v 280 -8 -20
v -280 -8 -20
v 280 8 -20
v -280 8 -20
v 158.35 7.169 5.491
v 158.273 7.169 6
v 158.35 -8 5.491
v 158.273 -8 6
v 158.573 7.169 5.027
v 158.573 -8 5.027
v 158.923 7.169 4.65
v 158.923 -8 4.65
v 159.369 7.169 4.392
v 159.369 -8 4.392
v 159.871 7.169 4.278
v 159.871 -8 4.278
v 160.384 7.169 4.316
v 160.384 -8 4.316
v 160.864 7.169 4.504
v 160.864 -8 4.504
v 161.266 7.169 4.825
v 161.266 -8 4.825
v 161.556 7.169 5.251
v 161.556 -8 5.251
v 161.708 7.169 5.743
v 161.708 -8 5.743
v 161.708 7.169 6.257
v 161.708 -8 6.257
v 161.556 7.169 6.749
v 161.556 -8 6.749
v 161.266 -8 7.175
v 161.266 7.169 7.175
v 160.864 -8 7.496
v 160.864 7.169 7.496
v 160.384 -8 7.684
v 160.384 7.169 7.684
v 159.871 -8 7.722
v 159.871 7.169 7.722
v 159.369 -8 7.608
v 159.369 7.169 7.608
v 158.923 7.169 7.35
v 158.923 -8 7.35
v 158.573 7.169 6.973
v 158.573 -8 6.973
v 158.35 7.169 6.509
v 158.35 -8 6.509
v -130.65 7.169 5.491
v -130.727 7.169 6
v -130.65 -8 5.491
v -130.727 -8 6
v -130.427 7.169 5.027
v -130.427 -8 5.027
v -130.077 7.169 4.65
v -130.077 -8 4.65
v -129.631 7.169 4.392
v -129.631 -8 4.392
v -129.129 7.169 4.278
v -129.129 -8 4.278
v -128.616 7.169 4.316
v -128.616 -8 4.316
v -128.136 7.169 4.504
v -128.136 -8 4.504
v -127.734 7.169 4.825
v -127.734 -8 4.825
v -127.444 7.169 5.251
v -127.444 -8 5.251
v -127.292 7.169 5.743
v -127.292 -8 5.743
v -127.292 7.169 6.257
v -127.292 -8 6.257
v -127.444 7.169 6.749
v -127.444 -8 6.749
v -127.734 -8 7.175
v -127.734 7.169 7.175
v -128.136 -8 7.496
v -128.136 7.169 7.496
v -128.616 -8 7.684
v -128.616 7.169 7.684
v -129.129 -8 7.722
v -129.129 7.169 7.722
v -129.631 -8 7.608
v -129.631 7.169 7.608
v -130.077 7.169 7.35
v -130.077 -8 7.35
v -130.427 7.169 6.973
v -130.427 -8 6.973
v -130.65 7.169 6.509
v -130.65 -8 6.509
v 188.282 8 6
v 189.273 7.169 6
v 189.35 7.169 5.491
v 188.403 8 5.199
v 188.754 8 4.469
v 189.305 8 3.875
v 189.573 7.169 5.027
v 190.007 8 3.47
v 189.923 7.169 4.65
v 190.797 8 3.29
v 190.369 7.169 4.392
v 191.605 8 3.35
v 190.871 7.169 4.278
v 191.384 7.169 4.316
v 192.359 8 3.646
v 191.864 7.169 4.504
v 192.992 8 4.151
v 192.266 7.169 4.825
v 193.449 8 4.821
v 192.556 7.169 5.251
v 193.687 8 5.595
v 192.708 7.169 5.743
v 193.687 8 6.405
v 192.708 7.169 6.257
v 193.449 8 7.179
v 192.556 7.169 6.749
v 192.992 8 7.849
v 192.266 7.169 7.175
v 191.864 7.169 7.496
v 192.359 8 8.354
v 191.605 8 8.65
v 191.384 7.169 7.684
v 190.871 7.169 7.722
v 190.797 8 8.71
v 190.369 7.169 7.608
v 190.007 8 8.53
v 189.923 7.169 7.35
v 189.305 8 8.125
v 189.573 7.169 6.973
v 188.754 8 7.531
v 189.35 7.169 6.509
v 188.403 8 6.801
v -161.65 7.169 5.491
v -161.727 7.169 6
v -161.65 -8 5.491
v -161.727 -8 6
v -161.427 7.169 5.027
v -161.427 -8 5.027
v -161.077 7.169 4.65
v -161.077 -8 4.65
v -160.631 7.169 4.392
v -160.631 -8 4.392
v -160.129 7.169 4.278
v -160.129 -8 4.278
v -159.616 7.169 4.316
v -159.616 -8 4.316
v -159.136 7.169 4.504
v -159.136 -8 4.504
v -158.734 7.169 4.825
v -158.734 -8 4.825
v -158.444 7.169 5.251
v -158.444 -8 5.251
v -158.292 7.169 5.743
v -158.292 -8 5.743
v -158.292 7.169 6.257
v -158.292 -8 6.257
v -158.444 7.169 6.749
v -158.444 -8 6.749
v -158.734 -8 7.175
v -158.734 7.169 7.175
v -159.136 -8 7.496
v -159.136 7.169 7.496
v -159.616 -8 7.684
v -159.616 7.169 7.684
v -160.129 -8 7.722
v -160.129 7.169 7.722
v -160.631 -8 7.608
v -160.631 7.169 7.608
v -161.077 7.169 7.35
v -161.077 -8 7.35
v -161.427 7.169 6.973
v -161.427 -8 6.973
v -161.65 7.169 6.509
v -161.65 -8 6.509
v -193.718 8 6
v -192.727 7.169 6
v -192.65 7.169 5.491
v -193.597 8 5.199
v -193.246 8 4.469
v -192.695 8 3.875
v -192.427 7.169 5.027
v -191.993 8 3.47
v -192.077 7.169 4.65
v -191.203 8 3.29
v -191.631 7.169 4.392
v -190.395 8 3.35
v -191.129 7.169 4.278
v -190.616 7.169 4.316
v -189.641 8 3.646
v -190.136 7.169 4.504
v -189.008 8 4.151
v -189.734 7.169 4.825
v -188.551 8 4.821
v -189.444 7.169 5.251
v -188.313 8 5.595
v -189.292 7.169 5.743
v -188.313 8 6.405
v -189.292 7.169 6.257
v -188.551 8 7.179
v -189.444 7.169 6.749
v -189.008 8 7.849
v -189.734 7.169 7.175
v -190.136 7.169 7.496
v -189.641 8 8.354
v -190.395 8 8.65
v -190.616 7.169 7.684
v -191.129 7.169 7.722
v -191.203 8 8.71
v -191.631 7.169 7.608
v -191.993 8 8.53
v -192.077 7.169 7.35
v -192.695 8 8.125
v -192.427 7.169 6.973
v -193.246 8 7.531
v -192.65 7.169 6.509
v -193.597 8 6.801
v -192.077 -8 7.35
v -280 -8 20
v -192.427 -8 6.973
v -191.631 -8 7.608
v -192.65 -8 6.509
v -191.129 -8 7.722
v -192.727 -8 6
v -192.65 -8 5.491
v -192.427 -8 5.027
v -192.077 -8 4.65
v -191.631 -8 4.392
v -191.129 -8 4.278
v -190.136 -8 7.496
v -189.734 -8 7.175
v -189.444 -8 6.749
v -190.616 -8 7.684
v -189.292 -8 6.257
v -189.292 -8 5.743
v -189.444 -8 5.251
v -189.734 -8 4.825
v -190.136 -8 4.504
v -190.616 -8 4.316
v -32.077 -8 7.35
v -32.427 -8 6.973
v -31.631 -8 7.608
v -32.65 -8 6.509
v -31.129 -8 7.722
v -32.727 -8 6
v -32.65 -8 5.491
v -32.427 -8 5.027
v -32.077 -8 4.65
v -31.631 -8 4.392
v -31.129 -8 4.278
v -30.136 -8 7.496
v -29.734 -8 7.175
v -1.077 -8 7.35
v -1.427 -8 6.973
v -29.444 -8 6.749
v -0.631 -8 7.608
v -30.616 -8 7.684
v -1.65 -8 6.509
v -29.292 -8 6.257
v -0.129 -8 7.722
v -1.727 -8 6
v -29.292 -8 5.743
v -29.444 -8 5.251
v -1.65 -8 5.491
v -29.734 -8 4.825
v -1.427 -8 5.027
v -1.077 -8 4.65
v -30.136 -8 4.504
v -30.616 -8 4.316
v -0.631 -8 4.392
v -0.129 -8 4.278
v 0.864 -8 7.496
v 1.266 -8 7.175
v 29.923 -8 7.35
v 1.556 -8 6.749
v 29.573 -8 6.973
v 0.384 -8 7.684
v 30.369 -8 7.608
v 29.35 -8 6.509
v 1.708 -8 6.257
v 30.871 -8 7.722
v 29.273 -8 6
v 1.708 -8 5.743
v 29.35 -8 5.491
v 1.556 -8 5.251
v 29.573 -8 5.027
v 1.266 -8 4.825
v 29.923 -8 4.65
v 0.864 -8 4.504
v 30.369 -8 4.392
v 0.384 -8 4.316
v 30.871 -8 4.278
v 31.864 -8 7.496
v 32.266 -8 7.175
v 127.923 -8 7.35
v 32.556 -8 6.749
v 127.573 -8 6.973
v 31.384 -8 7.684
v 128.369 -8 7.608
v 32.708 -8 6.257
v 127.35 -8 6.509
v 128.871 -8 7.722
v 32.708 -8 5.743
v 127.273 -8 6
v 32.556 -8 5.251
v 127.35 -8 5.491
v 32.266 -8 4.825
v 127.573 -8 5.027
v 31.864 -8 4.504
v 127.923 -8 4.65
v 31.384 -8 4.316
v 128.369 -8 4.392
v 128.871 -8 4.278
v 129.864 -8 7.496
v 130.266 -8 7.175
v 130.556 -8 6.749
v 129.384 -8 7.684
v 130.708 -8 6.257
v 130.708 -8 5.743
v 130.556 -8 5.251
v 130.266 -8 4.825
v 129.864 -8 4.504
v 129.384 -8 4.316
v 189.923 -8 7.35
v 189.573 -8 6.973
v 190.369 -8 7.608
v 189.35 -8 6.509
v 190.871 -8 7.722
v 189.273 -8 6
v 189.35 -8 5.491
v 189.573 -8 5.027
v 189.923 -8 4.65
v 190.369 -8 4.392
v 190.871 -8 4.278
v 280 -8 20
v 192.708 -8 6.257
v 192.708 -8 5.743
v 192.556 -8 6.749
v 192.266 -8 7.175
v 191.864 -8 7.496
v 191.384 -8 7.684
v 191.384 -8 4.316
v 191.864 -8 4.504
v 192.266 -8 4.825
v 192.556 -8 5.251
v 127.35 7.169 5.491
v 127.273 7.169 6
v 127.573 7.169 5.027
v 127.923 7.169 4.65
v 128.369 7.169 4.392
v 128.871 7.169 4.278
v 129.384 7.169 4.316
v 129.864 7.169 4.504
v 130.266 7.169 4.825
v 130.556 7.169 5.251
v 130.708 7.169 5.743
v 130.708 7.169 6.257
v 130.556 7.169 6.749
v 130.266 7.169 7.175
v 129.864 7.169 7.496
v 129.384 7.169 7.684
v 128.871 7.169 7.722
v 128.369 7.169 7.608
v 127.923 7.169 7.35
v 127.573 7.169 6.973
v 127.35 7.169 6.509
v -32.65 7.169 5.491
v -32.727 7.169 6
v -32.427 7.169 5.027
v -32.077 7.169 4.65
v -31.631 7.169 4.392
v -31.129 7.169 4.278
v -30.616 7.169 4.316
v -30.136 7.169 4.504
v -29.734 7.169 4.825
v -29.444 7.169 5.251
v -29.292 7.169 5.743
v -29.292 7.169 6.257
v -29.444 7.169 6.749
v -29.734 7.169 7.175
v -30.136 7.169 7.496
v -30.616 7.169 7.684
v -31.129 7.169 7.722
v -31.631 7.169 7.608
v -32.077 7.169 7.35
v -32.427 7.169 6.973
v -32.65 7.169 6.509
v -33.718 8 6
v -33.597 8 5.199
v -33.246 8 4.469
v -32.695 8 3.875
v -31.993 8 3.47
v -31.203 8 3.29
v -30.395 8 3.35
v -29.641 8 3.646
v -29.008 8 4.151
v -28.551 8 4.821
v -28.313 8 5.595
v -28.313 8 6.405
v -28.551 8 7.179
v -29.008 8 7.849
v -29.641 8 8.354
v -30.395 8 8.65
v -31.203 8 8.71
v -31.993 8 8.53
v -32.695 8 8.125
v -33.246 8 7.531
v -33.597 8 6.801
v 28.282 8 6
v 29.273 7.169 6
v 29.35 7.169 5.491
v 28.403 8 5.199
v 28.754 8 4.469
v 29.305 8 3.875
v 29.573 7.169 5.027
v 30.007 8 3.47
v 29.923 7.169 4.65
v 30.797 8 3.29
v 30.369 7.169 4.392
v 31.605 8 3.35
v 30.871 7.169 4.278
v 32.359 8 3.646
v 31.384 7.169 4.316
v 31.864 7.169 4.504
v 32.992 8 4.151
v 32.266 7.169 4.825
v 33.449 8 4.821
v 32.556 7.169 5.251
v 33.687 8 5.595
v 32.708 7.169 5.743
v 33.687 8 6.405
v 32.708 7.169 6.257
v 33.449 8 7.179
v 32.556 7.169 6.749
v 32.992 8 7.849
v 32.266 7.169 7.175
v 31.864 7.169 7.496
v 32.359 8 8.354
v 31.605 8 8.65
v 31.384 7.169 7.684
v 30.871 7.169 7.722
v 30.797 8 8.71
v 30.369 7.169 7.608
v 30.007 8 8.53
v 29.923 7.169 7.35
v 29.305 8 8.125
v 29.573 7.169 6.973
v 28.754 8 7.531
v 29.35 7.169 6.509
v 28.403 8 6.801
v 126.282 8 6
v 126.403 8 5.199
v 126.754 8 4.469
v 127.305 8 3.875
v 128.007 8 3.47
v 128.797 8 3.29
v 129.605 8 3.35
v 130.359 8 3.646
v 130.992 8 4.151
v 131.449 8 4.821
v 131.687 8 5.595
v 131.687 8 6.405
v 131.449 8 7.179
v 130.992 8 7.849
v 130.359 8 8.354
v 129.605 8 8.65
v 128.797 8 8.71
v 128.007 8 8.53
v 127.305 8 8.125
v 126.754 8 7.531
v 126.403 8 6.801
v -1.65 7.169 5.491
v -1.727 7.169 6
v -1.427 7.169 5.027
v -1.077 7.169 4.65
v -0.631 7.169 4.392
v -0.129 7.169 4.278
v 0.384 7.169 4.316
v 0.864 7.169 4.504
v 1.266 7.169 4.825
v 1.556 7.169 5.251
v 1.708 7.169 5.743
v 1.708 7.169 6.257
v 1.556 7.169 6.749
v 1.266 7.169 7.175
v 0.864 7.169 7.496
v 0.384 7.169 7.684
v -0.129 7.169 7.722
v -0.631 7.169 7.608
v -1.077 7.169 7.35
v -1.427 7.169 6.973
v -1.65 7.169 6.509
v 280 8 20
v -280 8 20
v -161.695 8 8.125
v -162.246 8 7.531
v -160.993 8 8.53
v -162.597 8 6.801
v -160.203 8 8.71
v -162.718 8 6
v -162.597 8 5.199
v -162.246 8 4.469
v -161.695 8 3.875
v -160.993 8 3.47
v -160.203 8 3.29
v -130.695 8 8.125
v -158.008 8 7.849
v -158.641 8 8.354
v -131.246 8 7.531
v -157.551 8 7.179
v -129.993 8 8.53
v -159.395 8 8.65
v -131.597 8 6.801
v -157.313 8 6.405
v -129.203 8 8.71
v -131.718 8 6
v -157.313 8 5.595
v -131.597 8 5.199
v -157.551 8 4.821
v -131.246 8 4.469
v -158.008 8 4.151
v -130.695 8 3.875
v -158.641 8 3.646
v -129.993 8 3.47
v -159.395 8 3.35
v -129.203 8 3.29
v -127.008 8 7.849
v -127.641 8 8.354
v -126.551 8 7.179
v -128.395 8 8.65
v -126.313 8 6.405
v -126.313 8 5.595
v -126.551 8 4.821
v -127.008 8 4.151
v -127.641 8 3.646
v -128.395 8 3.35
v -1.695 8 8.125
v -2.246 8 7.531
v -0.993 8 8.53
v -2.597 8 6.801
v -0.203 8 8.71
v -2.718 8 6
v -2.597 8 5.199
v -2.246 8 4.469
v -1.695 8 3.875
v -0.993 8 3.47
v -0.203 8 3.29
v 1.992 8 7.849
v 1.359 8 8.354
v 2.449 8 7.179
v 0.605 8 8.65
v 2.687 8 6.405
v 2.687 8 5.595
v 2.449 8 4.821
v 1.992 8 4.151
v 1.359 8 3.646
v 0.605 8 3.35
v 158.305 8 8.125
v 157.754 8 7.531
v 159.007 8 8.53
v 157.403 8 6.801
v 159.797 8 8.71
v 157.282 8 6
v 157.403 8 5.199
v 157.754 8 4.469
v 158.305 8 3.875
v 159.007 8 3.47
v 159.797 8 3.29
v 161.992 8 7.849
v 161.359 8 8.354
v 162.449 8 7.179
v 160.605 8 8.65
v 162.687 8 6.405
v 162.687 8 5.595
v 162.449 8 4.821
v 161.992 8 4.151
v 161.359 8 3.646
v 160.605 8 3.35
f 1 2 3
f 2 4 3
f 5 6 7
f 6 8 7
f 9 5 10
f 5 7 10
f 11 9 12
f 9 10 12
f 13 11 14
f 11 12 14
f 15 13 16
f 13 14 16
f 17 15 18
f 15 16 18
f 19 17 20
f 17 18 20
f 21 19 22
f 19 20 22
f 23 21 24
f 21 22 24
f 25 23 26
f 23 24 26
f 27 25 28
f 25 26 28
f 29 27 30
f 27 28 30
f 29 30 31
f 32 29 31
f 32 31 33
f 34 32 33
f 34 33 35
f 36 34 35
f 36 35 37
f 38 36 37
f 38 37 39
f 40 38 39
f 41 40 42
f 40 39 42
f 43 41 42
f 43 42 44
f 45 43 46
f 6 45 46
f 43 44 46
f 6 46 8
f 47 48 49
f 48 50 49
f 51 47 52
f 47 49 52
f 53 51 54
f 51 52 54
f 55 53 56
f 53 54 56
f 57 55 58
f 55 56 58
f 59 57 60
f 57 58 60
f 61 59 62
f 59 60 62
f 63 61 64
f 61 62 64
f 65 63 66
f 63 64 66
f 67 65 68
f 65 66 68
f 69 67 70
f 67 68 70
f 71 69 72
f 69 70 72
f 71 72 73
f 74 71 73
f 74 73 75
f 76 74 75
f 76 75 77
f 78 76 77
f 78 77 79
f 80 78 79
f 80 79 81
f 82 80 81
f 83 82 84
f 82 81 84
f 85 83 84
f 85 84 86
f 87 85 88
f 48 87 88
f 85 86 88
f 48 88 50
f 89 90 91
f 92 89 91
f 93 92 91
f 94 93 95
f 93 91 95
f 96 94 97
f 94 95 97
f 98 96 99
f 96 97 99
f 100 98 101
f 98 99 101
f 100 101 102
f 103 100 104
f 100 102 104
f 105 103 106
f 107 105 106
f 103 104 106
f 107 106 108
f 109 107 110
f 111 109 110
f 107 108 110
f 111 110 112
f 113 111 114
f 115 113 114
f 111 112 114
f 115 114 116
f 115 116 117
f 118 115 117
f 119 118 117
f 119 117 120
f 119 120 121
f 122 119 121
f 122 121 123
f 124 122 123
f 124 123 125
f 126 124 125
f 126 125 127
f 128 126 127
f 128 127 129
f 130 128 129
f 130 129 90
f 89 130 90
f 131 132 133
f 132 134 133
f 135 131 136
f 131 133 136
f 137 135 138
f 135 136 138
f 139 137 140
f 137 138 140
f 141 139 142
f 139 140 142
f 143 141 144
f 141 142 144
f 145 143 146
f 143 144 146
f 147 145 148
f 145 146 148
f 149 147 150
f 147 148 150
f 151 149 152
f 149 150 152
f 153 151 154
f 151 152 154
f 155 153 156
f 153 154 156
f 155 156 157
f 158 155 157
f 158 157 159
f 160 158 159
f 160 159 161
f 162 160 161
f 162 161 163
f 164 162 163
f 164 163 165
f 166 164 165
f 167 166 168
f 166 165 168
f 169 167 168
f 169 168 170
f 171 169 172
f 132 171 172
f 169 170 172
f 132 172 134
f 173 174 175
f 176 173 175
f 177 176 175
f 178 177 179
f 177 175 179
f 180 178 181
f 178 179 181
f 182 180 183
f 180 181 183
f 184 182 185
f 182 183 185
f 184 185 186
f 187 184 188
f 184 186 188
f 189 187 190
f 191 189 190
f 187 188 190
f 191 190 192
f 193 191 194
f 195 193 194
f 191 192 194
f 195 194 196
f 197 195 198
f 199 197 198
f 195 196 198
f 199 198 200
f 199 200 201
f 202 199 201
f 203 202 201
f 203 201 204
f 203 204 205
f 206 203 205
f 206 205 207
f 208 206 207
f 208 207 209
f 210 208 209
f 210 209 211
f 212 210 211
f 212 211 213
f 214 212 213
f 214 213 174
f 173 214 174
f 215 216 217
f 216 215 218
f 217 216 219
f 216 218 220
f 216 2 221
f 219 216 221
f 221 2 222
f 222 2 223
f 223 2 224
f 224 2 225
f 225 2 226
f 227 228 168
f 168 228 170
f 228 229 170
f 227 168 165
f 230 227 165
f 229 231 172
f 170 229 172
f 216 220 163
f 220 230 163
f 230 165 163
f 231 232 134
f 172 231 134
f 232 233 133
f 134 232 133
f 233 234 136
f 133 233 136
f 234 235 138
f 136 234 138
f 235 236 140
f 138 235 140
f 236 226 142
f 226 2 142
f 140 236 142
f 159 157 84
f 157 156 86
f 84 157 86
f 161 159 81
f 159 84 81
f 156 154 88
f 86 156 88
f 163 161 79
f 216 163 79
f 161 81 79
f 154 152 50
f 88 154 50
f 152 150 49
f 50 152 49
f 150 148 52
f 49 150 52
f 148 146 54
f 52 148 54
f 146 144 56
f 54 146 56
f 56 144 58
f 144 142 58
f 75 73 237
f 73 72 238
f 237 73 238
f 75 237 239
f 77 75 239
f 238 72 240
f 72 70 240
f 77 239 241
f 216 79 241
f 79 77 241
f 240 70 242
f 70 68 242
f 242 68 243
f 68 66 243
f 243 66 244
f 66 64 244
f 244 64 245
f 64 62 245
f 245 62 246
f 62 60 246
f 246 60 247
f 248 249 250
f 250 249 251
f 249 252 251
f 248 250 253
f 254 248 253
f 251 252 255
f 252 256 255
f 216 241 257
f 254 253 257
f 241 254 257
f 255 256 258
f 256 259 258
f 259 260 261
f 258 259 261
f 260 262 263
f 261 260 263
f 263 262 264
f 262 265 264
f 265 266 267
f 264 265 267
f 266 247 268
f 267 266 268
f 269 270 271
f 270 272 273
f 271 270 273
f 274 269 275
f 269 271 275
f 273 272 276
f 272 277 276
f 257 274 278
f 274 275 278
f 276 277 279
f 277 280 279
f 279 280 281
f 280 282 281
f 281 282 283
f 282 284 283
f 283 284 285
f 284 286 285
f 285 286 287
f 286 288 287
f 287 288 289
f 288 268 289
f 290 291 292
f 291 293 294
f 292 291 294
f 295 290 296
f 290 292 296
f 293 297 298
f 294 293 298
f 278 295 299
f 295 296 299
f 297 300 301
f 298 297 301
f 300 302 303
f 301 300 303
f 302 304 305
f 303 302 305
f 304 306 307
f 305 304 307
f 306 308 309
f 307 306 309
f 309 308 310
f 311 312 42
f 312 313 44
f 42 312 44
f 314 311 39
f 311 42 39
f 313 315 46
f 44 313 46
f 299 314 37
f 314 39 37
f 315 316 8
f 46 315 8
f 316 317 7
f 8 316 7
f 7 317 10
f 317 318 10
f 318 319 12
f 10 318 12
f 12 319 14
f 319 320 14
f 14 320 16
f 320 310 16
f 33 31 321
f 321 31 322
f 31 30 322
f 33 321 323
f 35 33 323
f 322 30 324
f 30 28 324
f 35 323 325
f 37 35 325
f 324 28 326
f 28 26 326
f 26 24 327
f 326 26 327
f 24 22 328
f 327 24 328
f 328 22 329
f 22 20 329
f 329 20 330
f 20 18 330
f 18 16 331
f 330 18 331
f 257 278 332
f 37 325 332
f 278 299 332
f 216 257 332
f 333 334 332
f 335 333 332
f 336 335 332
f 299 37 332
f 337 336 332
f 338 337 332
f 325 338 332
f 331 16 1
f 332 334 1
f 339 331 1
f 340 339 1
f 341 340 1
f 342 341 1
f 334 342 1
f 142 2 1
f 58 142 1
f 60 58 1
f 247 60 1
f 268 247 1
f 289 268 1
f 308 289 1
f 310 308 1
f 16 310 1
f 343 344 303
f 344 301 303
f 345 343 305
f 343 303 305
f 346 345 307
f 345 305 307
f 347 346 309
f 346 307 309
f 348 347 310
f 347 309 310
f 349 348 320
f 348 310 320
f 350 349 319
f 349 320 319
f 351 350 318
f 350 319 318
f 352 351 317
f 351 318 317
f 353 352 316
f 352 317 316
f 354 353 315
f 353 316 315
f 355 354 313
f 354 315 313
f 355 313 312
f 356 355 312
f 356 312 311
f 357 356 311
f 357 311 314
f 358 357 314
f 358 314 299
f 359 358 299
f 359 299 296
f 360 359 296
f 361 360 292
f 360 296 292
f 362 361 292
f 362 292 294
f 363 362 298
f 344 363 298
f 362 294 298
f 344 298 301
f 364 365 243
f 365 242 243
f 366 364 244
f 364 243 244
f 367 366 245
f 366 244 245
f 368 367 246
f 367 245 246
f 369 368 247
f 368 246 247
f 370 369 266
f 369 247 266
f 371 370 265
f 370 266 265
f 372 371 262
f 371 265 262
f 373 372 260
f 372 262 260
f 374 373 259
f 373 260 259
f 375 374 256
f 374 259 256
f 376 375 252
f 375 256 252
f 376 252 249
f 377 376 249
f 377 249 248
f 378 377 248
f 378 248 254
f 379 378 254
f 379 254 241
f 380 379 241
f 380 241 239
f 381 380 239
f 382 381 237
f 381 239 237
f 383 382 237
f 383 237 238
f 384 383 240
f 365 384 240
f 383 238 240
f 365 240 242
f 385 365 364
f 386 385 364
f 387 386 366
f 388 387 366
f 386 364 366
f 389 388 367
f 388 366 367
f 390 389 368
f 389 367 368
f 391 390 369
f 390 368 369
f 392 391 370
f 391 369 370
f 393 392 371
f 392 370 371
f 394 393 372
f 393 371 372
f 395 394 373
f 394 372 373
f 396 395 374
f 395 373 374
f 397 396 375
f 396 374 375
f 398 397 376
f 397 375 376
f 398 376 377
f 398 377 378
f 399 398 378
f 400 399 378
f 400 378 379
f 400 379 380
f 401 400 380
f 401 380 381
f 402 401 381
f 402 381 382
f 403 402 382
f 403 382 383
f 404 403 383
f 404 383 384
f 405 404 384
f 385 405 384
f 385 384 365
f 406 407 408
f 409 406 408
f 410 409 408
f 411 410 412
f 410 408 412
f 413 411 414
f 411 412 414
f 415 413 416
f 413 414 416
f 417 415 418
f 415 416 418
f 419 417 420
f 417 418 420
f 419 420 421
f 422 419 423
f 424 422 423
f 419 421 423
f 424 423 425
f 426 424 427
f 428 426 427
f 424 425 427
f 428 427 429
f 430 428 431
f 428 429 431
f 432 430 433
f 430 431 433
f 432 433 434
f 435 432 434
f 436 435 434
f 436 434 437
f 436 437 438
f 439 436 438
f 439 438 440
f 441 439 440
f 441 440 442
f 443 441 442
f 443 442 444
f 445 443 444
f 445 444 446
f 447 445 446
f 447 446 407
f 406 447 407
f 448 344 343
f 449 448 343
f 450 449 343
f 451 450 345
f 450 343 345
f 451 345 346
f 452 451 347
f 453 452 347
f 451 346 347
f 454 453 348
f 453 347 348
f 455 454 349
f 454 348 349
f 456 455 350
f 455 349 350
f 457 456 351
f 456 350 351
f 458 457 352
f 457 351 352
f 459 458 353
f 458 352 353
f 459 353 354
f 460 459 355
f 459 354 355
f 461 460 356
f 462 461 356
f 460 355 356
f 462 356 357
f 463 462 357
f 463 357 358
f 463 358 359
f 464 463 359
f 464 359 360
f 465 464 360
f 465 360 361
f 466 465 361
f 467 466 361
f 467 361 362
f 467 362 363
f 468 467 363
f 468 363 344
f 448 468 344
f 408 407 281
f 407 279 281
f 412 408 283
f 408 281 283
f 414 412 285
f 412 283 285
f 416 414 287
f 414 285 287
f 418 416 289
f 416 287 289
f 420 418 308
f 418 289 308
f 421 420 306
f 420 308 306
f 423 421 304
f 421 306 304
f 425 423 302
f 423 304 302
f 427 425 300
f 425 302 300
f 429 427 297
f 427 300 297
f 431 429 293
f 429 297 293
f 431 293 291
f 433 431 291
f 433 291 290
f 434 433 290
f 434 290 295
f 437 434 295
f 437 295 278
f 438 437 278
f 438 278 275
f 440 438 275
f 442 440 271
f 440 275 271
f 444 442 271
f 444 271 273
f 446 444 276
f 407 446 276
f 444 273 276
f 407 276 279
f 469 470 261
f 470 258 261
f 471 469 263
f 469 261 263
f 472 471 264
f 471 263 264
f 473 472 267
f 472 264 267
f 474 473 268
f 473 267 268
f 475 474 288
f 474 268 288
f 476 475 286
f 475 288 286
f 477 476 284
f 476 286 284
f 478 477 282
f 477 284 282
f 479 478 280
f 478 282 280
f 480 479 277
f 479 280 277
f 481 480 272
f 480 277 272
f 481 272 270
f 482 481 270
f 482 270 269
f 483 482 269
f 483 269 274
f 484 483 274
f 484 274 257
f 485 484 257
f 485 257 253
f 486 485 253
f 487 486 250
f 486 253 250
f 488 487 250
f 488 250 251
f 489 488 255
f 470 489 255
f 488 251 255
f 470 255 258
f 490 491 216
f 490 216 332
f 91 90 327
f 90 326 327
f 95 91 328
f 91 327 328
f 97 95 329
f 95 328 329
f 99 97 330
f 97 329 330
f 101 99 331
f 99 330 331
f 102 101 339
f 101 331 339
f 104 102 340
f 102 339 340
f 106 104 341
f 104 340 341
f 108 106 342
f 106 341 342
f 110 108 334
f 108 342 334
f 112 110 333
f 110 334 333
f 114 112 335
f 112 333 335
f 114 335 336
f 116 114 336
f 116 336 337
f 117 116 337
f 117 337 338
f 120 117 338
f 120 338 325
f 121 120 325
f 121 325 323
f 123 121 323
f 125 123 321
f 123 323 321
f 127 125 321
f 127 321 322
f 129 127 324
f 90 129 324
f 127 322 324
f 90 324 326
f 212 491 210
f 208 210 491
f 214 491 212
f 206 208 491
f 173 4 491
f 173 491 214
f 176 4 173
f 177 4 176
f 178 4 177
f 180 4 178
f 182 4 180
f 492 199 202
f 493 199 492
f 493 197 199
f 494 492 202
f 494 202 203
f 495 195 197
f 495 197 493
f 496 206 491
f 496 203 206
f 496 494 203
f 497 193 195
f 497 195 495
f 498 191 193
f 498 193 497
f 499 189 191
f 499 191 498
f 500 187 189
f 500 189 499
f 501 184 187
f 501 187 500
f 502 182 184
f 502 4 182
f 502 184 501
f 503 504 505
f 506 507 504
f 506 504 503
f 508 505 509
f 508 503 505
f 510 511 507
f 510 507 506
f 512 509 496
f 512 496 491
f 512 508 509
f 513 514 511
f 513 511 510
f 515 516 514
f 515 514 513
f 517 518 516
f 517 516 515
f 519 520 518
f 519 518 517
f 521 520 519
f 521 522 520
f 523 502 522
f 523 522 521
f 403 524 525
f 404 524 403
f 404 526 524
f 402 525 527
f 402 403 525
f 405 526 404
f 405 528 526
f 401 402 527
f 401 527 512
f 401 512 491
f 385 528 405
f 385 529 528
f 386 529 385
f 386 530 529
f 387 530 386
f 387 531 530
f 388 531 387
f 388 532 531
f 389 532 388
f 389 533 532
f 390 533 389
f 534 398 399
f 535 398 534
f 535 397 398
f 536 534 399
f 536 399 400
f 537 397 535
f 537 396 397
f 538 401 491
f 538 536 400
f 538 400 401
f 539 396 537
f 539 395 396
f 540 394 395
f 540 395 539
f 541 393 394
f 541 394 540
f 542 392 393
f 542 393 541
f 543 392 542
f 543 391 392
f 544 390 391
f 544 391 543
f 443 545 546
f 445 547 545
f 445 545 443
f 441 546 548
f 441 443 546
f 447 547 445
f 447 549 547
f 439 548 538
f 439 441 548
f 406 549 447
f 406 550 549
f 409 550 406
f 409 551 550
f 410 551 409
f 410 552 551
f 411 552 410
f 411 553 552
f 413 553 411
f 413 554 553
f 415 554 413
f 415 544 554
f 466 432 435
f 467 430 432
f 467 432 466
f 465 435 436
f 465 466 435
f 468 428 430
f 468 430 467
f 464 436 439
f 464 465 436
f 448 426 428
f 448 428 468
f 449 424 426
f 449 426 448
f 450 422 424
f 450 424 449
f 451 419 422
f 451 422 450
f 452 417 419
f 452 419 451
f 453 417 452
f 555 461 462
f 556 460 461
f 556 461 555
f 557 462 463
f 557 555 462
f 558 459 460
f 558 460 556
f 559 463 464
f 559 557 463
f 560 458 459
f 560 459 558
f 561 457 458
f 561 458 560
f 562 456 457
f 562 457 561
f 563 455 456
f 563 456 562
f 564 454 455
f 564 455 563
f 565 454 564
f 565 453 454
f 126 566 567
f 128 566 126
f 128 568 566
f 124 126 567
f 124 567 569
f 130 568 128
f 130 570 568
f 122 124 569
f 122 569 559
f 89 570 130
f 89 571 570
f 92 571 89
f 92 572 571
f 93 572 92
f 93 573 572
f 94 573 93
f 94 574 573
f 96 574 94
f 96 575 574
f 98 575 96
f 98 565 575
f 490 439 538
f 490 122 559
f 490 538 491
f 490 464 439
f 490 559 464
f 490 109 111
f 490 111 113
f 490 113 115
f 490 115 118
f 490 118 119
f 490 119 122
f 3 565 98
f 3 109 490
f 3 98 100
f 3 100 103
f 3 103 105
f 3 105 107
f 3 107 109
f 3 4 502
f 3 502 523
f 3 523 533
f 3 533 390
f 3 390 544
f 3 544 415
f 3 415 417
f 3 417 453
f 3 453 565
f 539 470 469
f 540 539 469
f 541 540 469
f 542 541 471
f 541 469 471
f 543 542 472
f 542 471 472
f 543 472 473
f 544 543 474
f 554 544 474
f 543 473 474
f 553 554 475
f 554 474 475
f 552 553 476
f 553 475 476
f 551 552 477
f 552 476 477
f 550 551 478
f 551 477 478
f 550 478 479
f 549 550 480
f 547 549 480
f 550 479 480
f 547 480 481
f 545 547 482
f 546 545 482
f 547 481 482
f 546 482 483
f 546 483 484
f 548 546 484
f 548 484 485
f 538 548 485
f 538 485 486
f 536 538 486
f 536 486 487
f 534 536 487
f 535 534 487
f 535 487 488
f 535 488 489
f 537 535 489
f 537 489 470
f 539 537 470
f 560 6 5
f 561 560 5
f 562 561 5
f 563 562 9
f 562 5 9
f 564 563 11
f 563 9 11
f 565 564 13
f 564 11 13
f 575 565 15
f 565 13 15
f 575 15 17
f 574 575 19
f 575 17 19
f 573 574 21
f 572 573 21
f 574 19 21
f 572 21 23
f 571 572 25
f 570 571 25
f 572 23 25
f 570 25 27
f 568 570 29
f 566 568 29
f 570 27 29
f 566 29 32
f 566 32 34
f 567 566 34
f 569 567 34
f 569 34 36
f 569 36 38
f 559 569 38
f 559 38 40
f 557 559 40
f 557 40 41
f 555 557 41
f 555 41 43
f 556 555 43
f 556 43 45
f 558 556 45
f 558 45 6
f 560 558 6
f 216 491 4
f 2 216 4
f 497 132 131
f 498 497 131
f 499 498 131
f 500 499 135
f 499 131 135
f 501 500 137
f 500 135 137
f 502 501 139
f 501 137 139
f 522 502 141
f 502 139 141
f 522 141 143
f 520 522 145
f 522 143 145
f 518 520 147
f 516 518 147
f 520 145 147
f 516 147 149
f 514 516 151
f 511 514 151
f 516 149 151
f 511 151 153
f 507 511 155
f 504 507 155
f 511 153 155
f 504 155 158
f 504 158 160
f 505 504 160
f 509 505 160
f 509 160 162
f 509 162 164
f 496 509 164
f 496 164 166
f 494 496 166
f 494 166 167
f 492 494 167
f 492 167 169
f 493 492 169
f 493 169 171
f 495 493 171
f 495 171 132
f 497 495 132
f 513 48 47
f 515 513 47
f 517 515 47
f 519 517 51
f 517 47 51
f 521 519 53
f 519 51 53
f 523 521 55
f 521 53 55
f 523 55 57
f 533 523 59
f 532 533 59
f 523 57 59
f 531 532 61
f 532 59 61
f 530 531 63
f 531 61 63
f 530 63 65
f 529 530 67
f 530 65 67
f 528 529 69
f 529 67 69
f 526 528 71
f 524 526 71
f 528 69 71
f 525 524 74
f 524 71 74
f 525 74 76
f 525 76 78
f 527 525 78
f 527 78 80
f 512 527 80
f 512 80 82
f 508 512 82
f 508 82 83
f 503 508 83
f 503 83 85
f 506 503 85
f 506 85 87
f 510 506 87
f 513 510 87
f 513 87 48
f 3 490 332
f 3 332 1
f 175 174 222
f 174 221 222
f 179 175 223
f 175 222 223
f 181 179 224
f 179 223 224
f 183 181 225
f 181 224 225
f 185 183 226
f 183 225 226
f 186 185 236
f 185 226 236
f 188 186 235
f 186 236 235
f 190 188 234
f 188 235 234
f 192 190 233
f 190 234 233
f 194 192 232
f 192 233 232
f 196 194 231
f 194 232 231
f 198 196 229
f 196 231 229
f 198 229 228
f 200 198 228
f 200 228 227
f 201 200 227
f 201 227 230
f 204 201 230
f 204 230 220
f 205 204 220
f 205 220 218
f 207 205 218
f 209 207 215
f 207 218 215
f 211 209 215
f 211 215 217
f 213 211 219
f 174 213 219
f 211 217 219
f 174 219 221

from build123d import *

# Parameters (mm, degrees)
SKETCH1_W                       = 560
SKETCH1_H                       = 40
BOSS_EXTRUDE1_DEPTH             = 8
F_8_36_TAPPED_HOLE1_D           = 3.4544
F_8_36_TAPPED_HOLE1_CSINK_D     = 5.4356
F_8_36_TAPPED_HOLE1_CSINK_ANGLE = 100
LPATTERN1_COUNT                 = 3
LPATTERN1_PITCH                 = 160


with BuildPart() as part:
    # Sketch1 → Boss-Extrude1 (new, symmetric)
    with BuildSketch(Plane(origin=(0, 0, 0), x_dir=(1, 0, 0), z_dir=(0, 1, 0))):
        Rectangle(SKETCH1_W, SKETCH1_H)
    extrude(amount=BOSS_EXTRUDE1_DEPTH, both=True)

    # #8-36 Tapped Hole1 (through all)
    with Locations(Plane(origin=(0, 8, 0), x_dir=(1, 0, 0), z_dir=(0, 1, 0))):
        with Locations((191, -6), (160, -6), (129, -6)):
            f_8_36_tapped_hole1 = CounterSinkHole(F_8_36_TAPPED_HOLE1_D / 2, F_8_36_TAPPED_HOLE1_CSINK_D / 2, counter_sink_angle=F_8_36_TAPPED_HOLE1_CSINK_ANGLE)

    # LPattern1: #8-36 Tapped Hole1 ×3
    with Locations(*[(-i * LPATTERN1_PITCH, 0, 0) for i in range(1, LPATTERN1_COUNT)]):
        add(f_8_36_tapped_hole1, mode=Mode.SUBTRACT)


solid = part.part
